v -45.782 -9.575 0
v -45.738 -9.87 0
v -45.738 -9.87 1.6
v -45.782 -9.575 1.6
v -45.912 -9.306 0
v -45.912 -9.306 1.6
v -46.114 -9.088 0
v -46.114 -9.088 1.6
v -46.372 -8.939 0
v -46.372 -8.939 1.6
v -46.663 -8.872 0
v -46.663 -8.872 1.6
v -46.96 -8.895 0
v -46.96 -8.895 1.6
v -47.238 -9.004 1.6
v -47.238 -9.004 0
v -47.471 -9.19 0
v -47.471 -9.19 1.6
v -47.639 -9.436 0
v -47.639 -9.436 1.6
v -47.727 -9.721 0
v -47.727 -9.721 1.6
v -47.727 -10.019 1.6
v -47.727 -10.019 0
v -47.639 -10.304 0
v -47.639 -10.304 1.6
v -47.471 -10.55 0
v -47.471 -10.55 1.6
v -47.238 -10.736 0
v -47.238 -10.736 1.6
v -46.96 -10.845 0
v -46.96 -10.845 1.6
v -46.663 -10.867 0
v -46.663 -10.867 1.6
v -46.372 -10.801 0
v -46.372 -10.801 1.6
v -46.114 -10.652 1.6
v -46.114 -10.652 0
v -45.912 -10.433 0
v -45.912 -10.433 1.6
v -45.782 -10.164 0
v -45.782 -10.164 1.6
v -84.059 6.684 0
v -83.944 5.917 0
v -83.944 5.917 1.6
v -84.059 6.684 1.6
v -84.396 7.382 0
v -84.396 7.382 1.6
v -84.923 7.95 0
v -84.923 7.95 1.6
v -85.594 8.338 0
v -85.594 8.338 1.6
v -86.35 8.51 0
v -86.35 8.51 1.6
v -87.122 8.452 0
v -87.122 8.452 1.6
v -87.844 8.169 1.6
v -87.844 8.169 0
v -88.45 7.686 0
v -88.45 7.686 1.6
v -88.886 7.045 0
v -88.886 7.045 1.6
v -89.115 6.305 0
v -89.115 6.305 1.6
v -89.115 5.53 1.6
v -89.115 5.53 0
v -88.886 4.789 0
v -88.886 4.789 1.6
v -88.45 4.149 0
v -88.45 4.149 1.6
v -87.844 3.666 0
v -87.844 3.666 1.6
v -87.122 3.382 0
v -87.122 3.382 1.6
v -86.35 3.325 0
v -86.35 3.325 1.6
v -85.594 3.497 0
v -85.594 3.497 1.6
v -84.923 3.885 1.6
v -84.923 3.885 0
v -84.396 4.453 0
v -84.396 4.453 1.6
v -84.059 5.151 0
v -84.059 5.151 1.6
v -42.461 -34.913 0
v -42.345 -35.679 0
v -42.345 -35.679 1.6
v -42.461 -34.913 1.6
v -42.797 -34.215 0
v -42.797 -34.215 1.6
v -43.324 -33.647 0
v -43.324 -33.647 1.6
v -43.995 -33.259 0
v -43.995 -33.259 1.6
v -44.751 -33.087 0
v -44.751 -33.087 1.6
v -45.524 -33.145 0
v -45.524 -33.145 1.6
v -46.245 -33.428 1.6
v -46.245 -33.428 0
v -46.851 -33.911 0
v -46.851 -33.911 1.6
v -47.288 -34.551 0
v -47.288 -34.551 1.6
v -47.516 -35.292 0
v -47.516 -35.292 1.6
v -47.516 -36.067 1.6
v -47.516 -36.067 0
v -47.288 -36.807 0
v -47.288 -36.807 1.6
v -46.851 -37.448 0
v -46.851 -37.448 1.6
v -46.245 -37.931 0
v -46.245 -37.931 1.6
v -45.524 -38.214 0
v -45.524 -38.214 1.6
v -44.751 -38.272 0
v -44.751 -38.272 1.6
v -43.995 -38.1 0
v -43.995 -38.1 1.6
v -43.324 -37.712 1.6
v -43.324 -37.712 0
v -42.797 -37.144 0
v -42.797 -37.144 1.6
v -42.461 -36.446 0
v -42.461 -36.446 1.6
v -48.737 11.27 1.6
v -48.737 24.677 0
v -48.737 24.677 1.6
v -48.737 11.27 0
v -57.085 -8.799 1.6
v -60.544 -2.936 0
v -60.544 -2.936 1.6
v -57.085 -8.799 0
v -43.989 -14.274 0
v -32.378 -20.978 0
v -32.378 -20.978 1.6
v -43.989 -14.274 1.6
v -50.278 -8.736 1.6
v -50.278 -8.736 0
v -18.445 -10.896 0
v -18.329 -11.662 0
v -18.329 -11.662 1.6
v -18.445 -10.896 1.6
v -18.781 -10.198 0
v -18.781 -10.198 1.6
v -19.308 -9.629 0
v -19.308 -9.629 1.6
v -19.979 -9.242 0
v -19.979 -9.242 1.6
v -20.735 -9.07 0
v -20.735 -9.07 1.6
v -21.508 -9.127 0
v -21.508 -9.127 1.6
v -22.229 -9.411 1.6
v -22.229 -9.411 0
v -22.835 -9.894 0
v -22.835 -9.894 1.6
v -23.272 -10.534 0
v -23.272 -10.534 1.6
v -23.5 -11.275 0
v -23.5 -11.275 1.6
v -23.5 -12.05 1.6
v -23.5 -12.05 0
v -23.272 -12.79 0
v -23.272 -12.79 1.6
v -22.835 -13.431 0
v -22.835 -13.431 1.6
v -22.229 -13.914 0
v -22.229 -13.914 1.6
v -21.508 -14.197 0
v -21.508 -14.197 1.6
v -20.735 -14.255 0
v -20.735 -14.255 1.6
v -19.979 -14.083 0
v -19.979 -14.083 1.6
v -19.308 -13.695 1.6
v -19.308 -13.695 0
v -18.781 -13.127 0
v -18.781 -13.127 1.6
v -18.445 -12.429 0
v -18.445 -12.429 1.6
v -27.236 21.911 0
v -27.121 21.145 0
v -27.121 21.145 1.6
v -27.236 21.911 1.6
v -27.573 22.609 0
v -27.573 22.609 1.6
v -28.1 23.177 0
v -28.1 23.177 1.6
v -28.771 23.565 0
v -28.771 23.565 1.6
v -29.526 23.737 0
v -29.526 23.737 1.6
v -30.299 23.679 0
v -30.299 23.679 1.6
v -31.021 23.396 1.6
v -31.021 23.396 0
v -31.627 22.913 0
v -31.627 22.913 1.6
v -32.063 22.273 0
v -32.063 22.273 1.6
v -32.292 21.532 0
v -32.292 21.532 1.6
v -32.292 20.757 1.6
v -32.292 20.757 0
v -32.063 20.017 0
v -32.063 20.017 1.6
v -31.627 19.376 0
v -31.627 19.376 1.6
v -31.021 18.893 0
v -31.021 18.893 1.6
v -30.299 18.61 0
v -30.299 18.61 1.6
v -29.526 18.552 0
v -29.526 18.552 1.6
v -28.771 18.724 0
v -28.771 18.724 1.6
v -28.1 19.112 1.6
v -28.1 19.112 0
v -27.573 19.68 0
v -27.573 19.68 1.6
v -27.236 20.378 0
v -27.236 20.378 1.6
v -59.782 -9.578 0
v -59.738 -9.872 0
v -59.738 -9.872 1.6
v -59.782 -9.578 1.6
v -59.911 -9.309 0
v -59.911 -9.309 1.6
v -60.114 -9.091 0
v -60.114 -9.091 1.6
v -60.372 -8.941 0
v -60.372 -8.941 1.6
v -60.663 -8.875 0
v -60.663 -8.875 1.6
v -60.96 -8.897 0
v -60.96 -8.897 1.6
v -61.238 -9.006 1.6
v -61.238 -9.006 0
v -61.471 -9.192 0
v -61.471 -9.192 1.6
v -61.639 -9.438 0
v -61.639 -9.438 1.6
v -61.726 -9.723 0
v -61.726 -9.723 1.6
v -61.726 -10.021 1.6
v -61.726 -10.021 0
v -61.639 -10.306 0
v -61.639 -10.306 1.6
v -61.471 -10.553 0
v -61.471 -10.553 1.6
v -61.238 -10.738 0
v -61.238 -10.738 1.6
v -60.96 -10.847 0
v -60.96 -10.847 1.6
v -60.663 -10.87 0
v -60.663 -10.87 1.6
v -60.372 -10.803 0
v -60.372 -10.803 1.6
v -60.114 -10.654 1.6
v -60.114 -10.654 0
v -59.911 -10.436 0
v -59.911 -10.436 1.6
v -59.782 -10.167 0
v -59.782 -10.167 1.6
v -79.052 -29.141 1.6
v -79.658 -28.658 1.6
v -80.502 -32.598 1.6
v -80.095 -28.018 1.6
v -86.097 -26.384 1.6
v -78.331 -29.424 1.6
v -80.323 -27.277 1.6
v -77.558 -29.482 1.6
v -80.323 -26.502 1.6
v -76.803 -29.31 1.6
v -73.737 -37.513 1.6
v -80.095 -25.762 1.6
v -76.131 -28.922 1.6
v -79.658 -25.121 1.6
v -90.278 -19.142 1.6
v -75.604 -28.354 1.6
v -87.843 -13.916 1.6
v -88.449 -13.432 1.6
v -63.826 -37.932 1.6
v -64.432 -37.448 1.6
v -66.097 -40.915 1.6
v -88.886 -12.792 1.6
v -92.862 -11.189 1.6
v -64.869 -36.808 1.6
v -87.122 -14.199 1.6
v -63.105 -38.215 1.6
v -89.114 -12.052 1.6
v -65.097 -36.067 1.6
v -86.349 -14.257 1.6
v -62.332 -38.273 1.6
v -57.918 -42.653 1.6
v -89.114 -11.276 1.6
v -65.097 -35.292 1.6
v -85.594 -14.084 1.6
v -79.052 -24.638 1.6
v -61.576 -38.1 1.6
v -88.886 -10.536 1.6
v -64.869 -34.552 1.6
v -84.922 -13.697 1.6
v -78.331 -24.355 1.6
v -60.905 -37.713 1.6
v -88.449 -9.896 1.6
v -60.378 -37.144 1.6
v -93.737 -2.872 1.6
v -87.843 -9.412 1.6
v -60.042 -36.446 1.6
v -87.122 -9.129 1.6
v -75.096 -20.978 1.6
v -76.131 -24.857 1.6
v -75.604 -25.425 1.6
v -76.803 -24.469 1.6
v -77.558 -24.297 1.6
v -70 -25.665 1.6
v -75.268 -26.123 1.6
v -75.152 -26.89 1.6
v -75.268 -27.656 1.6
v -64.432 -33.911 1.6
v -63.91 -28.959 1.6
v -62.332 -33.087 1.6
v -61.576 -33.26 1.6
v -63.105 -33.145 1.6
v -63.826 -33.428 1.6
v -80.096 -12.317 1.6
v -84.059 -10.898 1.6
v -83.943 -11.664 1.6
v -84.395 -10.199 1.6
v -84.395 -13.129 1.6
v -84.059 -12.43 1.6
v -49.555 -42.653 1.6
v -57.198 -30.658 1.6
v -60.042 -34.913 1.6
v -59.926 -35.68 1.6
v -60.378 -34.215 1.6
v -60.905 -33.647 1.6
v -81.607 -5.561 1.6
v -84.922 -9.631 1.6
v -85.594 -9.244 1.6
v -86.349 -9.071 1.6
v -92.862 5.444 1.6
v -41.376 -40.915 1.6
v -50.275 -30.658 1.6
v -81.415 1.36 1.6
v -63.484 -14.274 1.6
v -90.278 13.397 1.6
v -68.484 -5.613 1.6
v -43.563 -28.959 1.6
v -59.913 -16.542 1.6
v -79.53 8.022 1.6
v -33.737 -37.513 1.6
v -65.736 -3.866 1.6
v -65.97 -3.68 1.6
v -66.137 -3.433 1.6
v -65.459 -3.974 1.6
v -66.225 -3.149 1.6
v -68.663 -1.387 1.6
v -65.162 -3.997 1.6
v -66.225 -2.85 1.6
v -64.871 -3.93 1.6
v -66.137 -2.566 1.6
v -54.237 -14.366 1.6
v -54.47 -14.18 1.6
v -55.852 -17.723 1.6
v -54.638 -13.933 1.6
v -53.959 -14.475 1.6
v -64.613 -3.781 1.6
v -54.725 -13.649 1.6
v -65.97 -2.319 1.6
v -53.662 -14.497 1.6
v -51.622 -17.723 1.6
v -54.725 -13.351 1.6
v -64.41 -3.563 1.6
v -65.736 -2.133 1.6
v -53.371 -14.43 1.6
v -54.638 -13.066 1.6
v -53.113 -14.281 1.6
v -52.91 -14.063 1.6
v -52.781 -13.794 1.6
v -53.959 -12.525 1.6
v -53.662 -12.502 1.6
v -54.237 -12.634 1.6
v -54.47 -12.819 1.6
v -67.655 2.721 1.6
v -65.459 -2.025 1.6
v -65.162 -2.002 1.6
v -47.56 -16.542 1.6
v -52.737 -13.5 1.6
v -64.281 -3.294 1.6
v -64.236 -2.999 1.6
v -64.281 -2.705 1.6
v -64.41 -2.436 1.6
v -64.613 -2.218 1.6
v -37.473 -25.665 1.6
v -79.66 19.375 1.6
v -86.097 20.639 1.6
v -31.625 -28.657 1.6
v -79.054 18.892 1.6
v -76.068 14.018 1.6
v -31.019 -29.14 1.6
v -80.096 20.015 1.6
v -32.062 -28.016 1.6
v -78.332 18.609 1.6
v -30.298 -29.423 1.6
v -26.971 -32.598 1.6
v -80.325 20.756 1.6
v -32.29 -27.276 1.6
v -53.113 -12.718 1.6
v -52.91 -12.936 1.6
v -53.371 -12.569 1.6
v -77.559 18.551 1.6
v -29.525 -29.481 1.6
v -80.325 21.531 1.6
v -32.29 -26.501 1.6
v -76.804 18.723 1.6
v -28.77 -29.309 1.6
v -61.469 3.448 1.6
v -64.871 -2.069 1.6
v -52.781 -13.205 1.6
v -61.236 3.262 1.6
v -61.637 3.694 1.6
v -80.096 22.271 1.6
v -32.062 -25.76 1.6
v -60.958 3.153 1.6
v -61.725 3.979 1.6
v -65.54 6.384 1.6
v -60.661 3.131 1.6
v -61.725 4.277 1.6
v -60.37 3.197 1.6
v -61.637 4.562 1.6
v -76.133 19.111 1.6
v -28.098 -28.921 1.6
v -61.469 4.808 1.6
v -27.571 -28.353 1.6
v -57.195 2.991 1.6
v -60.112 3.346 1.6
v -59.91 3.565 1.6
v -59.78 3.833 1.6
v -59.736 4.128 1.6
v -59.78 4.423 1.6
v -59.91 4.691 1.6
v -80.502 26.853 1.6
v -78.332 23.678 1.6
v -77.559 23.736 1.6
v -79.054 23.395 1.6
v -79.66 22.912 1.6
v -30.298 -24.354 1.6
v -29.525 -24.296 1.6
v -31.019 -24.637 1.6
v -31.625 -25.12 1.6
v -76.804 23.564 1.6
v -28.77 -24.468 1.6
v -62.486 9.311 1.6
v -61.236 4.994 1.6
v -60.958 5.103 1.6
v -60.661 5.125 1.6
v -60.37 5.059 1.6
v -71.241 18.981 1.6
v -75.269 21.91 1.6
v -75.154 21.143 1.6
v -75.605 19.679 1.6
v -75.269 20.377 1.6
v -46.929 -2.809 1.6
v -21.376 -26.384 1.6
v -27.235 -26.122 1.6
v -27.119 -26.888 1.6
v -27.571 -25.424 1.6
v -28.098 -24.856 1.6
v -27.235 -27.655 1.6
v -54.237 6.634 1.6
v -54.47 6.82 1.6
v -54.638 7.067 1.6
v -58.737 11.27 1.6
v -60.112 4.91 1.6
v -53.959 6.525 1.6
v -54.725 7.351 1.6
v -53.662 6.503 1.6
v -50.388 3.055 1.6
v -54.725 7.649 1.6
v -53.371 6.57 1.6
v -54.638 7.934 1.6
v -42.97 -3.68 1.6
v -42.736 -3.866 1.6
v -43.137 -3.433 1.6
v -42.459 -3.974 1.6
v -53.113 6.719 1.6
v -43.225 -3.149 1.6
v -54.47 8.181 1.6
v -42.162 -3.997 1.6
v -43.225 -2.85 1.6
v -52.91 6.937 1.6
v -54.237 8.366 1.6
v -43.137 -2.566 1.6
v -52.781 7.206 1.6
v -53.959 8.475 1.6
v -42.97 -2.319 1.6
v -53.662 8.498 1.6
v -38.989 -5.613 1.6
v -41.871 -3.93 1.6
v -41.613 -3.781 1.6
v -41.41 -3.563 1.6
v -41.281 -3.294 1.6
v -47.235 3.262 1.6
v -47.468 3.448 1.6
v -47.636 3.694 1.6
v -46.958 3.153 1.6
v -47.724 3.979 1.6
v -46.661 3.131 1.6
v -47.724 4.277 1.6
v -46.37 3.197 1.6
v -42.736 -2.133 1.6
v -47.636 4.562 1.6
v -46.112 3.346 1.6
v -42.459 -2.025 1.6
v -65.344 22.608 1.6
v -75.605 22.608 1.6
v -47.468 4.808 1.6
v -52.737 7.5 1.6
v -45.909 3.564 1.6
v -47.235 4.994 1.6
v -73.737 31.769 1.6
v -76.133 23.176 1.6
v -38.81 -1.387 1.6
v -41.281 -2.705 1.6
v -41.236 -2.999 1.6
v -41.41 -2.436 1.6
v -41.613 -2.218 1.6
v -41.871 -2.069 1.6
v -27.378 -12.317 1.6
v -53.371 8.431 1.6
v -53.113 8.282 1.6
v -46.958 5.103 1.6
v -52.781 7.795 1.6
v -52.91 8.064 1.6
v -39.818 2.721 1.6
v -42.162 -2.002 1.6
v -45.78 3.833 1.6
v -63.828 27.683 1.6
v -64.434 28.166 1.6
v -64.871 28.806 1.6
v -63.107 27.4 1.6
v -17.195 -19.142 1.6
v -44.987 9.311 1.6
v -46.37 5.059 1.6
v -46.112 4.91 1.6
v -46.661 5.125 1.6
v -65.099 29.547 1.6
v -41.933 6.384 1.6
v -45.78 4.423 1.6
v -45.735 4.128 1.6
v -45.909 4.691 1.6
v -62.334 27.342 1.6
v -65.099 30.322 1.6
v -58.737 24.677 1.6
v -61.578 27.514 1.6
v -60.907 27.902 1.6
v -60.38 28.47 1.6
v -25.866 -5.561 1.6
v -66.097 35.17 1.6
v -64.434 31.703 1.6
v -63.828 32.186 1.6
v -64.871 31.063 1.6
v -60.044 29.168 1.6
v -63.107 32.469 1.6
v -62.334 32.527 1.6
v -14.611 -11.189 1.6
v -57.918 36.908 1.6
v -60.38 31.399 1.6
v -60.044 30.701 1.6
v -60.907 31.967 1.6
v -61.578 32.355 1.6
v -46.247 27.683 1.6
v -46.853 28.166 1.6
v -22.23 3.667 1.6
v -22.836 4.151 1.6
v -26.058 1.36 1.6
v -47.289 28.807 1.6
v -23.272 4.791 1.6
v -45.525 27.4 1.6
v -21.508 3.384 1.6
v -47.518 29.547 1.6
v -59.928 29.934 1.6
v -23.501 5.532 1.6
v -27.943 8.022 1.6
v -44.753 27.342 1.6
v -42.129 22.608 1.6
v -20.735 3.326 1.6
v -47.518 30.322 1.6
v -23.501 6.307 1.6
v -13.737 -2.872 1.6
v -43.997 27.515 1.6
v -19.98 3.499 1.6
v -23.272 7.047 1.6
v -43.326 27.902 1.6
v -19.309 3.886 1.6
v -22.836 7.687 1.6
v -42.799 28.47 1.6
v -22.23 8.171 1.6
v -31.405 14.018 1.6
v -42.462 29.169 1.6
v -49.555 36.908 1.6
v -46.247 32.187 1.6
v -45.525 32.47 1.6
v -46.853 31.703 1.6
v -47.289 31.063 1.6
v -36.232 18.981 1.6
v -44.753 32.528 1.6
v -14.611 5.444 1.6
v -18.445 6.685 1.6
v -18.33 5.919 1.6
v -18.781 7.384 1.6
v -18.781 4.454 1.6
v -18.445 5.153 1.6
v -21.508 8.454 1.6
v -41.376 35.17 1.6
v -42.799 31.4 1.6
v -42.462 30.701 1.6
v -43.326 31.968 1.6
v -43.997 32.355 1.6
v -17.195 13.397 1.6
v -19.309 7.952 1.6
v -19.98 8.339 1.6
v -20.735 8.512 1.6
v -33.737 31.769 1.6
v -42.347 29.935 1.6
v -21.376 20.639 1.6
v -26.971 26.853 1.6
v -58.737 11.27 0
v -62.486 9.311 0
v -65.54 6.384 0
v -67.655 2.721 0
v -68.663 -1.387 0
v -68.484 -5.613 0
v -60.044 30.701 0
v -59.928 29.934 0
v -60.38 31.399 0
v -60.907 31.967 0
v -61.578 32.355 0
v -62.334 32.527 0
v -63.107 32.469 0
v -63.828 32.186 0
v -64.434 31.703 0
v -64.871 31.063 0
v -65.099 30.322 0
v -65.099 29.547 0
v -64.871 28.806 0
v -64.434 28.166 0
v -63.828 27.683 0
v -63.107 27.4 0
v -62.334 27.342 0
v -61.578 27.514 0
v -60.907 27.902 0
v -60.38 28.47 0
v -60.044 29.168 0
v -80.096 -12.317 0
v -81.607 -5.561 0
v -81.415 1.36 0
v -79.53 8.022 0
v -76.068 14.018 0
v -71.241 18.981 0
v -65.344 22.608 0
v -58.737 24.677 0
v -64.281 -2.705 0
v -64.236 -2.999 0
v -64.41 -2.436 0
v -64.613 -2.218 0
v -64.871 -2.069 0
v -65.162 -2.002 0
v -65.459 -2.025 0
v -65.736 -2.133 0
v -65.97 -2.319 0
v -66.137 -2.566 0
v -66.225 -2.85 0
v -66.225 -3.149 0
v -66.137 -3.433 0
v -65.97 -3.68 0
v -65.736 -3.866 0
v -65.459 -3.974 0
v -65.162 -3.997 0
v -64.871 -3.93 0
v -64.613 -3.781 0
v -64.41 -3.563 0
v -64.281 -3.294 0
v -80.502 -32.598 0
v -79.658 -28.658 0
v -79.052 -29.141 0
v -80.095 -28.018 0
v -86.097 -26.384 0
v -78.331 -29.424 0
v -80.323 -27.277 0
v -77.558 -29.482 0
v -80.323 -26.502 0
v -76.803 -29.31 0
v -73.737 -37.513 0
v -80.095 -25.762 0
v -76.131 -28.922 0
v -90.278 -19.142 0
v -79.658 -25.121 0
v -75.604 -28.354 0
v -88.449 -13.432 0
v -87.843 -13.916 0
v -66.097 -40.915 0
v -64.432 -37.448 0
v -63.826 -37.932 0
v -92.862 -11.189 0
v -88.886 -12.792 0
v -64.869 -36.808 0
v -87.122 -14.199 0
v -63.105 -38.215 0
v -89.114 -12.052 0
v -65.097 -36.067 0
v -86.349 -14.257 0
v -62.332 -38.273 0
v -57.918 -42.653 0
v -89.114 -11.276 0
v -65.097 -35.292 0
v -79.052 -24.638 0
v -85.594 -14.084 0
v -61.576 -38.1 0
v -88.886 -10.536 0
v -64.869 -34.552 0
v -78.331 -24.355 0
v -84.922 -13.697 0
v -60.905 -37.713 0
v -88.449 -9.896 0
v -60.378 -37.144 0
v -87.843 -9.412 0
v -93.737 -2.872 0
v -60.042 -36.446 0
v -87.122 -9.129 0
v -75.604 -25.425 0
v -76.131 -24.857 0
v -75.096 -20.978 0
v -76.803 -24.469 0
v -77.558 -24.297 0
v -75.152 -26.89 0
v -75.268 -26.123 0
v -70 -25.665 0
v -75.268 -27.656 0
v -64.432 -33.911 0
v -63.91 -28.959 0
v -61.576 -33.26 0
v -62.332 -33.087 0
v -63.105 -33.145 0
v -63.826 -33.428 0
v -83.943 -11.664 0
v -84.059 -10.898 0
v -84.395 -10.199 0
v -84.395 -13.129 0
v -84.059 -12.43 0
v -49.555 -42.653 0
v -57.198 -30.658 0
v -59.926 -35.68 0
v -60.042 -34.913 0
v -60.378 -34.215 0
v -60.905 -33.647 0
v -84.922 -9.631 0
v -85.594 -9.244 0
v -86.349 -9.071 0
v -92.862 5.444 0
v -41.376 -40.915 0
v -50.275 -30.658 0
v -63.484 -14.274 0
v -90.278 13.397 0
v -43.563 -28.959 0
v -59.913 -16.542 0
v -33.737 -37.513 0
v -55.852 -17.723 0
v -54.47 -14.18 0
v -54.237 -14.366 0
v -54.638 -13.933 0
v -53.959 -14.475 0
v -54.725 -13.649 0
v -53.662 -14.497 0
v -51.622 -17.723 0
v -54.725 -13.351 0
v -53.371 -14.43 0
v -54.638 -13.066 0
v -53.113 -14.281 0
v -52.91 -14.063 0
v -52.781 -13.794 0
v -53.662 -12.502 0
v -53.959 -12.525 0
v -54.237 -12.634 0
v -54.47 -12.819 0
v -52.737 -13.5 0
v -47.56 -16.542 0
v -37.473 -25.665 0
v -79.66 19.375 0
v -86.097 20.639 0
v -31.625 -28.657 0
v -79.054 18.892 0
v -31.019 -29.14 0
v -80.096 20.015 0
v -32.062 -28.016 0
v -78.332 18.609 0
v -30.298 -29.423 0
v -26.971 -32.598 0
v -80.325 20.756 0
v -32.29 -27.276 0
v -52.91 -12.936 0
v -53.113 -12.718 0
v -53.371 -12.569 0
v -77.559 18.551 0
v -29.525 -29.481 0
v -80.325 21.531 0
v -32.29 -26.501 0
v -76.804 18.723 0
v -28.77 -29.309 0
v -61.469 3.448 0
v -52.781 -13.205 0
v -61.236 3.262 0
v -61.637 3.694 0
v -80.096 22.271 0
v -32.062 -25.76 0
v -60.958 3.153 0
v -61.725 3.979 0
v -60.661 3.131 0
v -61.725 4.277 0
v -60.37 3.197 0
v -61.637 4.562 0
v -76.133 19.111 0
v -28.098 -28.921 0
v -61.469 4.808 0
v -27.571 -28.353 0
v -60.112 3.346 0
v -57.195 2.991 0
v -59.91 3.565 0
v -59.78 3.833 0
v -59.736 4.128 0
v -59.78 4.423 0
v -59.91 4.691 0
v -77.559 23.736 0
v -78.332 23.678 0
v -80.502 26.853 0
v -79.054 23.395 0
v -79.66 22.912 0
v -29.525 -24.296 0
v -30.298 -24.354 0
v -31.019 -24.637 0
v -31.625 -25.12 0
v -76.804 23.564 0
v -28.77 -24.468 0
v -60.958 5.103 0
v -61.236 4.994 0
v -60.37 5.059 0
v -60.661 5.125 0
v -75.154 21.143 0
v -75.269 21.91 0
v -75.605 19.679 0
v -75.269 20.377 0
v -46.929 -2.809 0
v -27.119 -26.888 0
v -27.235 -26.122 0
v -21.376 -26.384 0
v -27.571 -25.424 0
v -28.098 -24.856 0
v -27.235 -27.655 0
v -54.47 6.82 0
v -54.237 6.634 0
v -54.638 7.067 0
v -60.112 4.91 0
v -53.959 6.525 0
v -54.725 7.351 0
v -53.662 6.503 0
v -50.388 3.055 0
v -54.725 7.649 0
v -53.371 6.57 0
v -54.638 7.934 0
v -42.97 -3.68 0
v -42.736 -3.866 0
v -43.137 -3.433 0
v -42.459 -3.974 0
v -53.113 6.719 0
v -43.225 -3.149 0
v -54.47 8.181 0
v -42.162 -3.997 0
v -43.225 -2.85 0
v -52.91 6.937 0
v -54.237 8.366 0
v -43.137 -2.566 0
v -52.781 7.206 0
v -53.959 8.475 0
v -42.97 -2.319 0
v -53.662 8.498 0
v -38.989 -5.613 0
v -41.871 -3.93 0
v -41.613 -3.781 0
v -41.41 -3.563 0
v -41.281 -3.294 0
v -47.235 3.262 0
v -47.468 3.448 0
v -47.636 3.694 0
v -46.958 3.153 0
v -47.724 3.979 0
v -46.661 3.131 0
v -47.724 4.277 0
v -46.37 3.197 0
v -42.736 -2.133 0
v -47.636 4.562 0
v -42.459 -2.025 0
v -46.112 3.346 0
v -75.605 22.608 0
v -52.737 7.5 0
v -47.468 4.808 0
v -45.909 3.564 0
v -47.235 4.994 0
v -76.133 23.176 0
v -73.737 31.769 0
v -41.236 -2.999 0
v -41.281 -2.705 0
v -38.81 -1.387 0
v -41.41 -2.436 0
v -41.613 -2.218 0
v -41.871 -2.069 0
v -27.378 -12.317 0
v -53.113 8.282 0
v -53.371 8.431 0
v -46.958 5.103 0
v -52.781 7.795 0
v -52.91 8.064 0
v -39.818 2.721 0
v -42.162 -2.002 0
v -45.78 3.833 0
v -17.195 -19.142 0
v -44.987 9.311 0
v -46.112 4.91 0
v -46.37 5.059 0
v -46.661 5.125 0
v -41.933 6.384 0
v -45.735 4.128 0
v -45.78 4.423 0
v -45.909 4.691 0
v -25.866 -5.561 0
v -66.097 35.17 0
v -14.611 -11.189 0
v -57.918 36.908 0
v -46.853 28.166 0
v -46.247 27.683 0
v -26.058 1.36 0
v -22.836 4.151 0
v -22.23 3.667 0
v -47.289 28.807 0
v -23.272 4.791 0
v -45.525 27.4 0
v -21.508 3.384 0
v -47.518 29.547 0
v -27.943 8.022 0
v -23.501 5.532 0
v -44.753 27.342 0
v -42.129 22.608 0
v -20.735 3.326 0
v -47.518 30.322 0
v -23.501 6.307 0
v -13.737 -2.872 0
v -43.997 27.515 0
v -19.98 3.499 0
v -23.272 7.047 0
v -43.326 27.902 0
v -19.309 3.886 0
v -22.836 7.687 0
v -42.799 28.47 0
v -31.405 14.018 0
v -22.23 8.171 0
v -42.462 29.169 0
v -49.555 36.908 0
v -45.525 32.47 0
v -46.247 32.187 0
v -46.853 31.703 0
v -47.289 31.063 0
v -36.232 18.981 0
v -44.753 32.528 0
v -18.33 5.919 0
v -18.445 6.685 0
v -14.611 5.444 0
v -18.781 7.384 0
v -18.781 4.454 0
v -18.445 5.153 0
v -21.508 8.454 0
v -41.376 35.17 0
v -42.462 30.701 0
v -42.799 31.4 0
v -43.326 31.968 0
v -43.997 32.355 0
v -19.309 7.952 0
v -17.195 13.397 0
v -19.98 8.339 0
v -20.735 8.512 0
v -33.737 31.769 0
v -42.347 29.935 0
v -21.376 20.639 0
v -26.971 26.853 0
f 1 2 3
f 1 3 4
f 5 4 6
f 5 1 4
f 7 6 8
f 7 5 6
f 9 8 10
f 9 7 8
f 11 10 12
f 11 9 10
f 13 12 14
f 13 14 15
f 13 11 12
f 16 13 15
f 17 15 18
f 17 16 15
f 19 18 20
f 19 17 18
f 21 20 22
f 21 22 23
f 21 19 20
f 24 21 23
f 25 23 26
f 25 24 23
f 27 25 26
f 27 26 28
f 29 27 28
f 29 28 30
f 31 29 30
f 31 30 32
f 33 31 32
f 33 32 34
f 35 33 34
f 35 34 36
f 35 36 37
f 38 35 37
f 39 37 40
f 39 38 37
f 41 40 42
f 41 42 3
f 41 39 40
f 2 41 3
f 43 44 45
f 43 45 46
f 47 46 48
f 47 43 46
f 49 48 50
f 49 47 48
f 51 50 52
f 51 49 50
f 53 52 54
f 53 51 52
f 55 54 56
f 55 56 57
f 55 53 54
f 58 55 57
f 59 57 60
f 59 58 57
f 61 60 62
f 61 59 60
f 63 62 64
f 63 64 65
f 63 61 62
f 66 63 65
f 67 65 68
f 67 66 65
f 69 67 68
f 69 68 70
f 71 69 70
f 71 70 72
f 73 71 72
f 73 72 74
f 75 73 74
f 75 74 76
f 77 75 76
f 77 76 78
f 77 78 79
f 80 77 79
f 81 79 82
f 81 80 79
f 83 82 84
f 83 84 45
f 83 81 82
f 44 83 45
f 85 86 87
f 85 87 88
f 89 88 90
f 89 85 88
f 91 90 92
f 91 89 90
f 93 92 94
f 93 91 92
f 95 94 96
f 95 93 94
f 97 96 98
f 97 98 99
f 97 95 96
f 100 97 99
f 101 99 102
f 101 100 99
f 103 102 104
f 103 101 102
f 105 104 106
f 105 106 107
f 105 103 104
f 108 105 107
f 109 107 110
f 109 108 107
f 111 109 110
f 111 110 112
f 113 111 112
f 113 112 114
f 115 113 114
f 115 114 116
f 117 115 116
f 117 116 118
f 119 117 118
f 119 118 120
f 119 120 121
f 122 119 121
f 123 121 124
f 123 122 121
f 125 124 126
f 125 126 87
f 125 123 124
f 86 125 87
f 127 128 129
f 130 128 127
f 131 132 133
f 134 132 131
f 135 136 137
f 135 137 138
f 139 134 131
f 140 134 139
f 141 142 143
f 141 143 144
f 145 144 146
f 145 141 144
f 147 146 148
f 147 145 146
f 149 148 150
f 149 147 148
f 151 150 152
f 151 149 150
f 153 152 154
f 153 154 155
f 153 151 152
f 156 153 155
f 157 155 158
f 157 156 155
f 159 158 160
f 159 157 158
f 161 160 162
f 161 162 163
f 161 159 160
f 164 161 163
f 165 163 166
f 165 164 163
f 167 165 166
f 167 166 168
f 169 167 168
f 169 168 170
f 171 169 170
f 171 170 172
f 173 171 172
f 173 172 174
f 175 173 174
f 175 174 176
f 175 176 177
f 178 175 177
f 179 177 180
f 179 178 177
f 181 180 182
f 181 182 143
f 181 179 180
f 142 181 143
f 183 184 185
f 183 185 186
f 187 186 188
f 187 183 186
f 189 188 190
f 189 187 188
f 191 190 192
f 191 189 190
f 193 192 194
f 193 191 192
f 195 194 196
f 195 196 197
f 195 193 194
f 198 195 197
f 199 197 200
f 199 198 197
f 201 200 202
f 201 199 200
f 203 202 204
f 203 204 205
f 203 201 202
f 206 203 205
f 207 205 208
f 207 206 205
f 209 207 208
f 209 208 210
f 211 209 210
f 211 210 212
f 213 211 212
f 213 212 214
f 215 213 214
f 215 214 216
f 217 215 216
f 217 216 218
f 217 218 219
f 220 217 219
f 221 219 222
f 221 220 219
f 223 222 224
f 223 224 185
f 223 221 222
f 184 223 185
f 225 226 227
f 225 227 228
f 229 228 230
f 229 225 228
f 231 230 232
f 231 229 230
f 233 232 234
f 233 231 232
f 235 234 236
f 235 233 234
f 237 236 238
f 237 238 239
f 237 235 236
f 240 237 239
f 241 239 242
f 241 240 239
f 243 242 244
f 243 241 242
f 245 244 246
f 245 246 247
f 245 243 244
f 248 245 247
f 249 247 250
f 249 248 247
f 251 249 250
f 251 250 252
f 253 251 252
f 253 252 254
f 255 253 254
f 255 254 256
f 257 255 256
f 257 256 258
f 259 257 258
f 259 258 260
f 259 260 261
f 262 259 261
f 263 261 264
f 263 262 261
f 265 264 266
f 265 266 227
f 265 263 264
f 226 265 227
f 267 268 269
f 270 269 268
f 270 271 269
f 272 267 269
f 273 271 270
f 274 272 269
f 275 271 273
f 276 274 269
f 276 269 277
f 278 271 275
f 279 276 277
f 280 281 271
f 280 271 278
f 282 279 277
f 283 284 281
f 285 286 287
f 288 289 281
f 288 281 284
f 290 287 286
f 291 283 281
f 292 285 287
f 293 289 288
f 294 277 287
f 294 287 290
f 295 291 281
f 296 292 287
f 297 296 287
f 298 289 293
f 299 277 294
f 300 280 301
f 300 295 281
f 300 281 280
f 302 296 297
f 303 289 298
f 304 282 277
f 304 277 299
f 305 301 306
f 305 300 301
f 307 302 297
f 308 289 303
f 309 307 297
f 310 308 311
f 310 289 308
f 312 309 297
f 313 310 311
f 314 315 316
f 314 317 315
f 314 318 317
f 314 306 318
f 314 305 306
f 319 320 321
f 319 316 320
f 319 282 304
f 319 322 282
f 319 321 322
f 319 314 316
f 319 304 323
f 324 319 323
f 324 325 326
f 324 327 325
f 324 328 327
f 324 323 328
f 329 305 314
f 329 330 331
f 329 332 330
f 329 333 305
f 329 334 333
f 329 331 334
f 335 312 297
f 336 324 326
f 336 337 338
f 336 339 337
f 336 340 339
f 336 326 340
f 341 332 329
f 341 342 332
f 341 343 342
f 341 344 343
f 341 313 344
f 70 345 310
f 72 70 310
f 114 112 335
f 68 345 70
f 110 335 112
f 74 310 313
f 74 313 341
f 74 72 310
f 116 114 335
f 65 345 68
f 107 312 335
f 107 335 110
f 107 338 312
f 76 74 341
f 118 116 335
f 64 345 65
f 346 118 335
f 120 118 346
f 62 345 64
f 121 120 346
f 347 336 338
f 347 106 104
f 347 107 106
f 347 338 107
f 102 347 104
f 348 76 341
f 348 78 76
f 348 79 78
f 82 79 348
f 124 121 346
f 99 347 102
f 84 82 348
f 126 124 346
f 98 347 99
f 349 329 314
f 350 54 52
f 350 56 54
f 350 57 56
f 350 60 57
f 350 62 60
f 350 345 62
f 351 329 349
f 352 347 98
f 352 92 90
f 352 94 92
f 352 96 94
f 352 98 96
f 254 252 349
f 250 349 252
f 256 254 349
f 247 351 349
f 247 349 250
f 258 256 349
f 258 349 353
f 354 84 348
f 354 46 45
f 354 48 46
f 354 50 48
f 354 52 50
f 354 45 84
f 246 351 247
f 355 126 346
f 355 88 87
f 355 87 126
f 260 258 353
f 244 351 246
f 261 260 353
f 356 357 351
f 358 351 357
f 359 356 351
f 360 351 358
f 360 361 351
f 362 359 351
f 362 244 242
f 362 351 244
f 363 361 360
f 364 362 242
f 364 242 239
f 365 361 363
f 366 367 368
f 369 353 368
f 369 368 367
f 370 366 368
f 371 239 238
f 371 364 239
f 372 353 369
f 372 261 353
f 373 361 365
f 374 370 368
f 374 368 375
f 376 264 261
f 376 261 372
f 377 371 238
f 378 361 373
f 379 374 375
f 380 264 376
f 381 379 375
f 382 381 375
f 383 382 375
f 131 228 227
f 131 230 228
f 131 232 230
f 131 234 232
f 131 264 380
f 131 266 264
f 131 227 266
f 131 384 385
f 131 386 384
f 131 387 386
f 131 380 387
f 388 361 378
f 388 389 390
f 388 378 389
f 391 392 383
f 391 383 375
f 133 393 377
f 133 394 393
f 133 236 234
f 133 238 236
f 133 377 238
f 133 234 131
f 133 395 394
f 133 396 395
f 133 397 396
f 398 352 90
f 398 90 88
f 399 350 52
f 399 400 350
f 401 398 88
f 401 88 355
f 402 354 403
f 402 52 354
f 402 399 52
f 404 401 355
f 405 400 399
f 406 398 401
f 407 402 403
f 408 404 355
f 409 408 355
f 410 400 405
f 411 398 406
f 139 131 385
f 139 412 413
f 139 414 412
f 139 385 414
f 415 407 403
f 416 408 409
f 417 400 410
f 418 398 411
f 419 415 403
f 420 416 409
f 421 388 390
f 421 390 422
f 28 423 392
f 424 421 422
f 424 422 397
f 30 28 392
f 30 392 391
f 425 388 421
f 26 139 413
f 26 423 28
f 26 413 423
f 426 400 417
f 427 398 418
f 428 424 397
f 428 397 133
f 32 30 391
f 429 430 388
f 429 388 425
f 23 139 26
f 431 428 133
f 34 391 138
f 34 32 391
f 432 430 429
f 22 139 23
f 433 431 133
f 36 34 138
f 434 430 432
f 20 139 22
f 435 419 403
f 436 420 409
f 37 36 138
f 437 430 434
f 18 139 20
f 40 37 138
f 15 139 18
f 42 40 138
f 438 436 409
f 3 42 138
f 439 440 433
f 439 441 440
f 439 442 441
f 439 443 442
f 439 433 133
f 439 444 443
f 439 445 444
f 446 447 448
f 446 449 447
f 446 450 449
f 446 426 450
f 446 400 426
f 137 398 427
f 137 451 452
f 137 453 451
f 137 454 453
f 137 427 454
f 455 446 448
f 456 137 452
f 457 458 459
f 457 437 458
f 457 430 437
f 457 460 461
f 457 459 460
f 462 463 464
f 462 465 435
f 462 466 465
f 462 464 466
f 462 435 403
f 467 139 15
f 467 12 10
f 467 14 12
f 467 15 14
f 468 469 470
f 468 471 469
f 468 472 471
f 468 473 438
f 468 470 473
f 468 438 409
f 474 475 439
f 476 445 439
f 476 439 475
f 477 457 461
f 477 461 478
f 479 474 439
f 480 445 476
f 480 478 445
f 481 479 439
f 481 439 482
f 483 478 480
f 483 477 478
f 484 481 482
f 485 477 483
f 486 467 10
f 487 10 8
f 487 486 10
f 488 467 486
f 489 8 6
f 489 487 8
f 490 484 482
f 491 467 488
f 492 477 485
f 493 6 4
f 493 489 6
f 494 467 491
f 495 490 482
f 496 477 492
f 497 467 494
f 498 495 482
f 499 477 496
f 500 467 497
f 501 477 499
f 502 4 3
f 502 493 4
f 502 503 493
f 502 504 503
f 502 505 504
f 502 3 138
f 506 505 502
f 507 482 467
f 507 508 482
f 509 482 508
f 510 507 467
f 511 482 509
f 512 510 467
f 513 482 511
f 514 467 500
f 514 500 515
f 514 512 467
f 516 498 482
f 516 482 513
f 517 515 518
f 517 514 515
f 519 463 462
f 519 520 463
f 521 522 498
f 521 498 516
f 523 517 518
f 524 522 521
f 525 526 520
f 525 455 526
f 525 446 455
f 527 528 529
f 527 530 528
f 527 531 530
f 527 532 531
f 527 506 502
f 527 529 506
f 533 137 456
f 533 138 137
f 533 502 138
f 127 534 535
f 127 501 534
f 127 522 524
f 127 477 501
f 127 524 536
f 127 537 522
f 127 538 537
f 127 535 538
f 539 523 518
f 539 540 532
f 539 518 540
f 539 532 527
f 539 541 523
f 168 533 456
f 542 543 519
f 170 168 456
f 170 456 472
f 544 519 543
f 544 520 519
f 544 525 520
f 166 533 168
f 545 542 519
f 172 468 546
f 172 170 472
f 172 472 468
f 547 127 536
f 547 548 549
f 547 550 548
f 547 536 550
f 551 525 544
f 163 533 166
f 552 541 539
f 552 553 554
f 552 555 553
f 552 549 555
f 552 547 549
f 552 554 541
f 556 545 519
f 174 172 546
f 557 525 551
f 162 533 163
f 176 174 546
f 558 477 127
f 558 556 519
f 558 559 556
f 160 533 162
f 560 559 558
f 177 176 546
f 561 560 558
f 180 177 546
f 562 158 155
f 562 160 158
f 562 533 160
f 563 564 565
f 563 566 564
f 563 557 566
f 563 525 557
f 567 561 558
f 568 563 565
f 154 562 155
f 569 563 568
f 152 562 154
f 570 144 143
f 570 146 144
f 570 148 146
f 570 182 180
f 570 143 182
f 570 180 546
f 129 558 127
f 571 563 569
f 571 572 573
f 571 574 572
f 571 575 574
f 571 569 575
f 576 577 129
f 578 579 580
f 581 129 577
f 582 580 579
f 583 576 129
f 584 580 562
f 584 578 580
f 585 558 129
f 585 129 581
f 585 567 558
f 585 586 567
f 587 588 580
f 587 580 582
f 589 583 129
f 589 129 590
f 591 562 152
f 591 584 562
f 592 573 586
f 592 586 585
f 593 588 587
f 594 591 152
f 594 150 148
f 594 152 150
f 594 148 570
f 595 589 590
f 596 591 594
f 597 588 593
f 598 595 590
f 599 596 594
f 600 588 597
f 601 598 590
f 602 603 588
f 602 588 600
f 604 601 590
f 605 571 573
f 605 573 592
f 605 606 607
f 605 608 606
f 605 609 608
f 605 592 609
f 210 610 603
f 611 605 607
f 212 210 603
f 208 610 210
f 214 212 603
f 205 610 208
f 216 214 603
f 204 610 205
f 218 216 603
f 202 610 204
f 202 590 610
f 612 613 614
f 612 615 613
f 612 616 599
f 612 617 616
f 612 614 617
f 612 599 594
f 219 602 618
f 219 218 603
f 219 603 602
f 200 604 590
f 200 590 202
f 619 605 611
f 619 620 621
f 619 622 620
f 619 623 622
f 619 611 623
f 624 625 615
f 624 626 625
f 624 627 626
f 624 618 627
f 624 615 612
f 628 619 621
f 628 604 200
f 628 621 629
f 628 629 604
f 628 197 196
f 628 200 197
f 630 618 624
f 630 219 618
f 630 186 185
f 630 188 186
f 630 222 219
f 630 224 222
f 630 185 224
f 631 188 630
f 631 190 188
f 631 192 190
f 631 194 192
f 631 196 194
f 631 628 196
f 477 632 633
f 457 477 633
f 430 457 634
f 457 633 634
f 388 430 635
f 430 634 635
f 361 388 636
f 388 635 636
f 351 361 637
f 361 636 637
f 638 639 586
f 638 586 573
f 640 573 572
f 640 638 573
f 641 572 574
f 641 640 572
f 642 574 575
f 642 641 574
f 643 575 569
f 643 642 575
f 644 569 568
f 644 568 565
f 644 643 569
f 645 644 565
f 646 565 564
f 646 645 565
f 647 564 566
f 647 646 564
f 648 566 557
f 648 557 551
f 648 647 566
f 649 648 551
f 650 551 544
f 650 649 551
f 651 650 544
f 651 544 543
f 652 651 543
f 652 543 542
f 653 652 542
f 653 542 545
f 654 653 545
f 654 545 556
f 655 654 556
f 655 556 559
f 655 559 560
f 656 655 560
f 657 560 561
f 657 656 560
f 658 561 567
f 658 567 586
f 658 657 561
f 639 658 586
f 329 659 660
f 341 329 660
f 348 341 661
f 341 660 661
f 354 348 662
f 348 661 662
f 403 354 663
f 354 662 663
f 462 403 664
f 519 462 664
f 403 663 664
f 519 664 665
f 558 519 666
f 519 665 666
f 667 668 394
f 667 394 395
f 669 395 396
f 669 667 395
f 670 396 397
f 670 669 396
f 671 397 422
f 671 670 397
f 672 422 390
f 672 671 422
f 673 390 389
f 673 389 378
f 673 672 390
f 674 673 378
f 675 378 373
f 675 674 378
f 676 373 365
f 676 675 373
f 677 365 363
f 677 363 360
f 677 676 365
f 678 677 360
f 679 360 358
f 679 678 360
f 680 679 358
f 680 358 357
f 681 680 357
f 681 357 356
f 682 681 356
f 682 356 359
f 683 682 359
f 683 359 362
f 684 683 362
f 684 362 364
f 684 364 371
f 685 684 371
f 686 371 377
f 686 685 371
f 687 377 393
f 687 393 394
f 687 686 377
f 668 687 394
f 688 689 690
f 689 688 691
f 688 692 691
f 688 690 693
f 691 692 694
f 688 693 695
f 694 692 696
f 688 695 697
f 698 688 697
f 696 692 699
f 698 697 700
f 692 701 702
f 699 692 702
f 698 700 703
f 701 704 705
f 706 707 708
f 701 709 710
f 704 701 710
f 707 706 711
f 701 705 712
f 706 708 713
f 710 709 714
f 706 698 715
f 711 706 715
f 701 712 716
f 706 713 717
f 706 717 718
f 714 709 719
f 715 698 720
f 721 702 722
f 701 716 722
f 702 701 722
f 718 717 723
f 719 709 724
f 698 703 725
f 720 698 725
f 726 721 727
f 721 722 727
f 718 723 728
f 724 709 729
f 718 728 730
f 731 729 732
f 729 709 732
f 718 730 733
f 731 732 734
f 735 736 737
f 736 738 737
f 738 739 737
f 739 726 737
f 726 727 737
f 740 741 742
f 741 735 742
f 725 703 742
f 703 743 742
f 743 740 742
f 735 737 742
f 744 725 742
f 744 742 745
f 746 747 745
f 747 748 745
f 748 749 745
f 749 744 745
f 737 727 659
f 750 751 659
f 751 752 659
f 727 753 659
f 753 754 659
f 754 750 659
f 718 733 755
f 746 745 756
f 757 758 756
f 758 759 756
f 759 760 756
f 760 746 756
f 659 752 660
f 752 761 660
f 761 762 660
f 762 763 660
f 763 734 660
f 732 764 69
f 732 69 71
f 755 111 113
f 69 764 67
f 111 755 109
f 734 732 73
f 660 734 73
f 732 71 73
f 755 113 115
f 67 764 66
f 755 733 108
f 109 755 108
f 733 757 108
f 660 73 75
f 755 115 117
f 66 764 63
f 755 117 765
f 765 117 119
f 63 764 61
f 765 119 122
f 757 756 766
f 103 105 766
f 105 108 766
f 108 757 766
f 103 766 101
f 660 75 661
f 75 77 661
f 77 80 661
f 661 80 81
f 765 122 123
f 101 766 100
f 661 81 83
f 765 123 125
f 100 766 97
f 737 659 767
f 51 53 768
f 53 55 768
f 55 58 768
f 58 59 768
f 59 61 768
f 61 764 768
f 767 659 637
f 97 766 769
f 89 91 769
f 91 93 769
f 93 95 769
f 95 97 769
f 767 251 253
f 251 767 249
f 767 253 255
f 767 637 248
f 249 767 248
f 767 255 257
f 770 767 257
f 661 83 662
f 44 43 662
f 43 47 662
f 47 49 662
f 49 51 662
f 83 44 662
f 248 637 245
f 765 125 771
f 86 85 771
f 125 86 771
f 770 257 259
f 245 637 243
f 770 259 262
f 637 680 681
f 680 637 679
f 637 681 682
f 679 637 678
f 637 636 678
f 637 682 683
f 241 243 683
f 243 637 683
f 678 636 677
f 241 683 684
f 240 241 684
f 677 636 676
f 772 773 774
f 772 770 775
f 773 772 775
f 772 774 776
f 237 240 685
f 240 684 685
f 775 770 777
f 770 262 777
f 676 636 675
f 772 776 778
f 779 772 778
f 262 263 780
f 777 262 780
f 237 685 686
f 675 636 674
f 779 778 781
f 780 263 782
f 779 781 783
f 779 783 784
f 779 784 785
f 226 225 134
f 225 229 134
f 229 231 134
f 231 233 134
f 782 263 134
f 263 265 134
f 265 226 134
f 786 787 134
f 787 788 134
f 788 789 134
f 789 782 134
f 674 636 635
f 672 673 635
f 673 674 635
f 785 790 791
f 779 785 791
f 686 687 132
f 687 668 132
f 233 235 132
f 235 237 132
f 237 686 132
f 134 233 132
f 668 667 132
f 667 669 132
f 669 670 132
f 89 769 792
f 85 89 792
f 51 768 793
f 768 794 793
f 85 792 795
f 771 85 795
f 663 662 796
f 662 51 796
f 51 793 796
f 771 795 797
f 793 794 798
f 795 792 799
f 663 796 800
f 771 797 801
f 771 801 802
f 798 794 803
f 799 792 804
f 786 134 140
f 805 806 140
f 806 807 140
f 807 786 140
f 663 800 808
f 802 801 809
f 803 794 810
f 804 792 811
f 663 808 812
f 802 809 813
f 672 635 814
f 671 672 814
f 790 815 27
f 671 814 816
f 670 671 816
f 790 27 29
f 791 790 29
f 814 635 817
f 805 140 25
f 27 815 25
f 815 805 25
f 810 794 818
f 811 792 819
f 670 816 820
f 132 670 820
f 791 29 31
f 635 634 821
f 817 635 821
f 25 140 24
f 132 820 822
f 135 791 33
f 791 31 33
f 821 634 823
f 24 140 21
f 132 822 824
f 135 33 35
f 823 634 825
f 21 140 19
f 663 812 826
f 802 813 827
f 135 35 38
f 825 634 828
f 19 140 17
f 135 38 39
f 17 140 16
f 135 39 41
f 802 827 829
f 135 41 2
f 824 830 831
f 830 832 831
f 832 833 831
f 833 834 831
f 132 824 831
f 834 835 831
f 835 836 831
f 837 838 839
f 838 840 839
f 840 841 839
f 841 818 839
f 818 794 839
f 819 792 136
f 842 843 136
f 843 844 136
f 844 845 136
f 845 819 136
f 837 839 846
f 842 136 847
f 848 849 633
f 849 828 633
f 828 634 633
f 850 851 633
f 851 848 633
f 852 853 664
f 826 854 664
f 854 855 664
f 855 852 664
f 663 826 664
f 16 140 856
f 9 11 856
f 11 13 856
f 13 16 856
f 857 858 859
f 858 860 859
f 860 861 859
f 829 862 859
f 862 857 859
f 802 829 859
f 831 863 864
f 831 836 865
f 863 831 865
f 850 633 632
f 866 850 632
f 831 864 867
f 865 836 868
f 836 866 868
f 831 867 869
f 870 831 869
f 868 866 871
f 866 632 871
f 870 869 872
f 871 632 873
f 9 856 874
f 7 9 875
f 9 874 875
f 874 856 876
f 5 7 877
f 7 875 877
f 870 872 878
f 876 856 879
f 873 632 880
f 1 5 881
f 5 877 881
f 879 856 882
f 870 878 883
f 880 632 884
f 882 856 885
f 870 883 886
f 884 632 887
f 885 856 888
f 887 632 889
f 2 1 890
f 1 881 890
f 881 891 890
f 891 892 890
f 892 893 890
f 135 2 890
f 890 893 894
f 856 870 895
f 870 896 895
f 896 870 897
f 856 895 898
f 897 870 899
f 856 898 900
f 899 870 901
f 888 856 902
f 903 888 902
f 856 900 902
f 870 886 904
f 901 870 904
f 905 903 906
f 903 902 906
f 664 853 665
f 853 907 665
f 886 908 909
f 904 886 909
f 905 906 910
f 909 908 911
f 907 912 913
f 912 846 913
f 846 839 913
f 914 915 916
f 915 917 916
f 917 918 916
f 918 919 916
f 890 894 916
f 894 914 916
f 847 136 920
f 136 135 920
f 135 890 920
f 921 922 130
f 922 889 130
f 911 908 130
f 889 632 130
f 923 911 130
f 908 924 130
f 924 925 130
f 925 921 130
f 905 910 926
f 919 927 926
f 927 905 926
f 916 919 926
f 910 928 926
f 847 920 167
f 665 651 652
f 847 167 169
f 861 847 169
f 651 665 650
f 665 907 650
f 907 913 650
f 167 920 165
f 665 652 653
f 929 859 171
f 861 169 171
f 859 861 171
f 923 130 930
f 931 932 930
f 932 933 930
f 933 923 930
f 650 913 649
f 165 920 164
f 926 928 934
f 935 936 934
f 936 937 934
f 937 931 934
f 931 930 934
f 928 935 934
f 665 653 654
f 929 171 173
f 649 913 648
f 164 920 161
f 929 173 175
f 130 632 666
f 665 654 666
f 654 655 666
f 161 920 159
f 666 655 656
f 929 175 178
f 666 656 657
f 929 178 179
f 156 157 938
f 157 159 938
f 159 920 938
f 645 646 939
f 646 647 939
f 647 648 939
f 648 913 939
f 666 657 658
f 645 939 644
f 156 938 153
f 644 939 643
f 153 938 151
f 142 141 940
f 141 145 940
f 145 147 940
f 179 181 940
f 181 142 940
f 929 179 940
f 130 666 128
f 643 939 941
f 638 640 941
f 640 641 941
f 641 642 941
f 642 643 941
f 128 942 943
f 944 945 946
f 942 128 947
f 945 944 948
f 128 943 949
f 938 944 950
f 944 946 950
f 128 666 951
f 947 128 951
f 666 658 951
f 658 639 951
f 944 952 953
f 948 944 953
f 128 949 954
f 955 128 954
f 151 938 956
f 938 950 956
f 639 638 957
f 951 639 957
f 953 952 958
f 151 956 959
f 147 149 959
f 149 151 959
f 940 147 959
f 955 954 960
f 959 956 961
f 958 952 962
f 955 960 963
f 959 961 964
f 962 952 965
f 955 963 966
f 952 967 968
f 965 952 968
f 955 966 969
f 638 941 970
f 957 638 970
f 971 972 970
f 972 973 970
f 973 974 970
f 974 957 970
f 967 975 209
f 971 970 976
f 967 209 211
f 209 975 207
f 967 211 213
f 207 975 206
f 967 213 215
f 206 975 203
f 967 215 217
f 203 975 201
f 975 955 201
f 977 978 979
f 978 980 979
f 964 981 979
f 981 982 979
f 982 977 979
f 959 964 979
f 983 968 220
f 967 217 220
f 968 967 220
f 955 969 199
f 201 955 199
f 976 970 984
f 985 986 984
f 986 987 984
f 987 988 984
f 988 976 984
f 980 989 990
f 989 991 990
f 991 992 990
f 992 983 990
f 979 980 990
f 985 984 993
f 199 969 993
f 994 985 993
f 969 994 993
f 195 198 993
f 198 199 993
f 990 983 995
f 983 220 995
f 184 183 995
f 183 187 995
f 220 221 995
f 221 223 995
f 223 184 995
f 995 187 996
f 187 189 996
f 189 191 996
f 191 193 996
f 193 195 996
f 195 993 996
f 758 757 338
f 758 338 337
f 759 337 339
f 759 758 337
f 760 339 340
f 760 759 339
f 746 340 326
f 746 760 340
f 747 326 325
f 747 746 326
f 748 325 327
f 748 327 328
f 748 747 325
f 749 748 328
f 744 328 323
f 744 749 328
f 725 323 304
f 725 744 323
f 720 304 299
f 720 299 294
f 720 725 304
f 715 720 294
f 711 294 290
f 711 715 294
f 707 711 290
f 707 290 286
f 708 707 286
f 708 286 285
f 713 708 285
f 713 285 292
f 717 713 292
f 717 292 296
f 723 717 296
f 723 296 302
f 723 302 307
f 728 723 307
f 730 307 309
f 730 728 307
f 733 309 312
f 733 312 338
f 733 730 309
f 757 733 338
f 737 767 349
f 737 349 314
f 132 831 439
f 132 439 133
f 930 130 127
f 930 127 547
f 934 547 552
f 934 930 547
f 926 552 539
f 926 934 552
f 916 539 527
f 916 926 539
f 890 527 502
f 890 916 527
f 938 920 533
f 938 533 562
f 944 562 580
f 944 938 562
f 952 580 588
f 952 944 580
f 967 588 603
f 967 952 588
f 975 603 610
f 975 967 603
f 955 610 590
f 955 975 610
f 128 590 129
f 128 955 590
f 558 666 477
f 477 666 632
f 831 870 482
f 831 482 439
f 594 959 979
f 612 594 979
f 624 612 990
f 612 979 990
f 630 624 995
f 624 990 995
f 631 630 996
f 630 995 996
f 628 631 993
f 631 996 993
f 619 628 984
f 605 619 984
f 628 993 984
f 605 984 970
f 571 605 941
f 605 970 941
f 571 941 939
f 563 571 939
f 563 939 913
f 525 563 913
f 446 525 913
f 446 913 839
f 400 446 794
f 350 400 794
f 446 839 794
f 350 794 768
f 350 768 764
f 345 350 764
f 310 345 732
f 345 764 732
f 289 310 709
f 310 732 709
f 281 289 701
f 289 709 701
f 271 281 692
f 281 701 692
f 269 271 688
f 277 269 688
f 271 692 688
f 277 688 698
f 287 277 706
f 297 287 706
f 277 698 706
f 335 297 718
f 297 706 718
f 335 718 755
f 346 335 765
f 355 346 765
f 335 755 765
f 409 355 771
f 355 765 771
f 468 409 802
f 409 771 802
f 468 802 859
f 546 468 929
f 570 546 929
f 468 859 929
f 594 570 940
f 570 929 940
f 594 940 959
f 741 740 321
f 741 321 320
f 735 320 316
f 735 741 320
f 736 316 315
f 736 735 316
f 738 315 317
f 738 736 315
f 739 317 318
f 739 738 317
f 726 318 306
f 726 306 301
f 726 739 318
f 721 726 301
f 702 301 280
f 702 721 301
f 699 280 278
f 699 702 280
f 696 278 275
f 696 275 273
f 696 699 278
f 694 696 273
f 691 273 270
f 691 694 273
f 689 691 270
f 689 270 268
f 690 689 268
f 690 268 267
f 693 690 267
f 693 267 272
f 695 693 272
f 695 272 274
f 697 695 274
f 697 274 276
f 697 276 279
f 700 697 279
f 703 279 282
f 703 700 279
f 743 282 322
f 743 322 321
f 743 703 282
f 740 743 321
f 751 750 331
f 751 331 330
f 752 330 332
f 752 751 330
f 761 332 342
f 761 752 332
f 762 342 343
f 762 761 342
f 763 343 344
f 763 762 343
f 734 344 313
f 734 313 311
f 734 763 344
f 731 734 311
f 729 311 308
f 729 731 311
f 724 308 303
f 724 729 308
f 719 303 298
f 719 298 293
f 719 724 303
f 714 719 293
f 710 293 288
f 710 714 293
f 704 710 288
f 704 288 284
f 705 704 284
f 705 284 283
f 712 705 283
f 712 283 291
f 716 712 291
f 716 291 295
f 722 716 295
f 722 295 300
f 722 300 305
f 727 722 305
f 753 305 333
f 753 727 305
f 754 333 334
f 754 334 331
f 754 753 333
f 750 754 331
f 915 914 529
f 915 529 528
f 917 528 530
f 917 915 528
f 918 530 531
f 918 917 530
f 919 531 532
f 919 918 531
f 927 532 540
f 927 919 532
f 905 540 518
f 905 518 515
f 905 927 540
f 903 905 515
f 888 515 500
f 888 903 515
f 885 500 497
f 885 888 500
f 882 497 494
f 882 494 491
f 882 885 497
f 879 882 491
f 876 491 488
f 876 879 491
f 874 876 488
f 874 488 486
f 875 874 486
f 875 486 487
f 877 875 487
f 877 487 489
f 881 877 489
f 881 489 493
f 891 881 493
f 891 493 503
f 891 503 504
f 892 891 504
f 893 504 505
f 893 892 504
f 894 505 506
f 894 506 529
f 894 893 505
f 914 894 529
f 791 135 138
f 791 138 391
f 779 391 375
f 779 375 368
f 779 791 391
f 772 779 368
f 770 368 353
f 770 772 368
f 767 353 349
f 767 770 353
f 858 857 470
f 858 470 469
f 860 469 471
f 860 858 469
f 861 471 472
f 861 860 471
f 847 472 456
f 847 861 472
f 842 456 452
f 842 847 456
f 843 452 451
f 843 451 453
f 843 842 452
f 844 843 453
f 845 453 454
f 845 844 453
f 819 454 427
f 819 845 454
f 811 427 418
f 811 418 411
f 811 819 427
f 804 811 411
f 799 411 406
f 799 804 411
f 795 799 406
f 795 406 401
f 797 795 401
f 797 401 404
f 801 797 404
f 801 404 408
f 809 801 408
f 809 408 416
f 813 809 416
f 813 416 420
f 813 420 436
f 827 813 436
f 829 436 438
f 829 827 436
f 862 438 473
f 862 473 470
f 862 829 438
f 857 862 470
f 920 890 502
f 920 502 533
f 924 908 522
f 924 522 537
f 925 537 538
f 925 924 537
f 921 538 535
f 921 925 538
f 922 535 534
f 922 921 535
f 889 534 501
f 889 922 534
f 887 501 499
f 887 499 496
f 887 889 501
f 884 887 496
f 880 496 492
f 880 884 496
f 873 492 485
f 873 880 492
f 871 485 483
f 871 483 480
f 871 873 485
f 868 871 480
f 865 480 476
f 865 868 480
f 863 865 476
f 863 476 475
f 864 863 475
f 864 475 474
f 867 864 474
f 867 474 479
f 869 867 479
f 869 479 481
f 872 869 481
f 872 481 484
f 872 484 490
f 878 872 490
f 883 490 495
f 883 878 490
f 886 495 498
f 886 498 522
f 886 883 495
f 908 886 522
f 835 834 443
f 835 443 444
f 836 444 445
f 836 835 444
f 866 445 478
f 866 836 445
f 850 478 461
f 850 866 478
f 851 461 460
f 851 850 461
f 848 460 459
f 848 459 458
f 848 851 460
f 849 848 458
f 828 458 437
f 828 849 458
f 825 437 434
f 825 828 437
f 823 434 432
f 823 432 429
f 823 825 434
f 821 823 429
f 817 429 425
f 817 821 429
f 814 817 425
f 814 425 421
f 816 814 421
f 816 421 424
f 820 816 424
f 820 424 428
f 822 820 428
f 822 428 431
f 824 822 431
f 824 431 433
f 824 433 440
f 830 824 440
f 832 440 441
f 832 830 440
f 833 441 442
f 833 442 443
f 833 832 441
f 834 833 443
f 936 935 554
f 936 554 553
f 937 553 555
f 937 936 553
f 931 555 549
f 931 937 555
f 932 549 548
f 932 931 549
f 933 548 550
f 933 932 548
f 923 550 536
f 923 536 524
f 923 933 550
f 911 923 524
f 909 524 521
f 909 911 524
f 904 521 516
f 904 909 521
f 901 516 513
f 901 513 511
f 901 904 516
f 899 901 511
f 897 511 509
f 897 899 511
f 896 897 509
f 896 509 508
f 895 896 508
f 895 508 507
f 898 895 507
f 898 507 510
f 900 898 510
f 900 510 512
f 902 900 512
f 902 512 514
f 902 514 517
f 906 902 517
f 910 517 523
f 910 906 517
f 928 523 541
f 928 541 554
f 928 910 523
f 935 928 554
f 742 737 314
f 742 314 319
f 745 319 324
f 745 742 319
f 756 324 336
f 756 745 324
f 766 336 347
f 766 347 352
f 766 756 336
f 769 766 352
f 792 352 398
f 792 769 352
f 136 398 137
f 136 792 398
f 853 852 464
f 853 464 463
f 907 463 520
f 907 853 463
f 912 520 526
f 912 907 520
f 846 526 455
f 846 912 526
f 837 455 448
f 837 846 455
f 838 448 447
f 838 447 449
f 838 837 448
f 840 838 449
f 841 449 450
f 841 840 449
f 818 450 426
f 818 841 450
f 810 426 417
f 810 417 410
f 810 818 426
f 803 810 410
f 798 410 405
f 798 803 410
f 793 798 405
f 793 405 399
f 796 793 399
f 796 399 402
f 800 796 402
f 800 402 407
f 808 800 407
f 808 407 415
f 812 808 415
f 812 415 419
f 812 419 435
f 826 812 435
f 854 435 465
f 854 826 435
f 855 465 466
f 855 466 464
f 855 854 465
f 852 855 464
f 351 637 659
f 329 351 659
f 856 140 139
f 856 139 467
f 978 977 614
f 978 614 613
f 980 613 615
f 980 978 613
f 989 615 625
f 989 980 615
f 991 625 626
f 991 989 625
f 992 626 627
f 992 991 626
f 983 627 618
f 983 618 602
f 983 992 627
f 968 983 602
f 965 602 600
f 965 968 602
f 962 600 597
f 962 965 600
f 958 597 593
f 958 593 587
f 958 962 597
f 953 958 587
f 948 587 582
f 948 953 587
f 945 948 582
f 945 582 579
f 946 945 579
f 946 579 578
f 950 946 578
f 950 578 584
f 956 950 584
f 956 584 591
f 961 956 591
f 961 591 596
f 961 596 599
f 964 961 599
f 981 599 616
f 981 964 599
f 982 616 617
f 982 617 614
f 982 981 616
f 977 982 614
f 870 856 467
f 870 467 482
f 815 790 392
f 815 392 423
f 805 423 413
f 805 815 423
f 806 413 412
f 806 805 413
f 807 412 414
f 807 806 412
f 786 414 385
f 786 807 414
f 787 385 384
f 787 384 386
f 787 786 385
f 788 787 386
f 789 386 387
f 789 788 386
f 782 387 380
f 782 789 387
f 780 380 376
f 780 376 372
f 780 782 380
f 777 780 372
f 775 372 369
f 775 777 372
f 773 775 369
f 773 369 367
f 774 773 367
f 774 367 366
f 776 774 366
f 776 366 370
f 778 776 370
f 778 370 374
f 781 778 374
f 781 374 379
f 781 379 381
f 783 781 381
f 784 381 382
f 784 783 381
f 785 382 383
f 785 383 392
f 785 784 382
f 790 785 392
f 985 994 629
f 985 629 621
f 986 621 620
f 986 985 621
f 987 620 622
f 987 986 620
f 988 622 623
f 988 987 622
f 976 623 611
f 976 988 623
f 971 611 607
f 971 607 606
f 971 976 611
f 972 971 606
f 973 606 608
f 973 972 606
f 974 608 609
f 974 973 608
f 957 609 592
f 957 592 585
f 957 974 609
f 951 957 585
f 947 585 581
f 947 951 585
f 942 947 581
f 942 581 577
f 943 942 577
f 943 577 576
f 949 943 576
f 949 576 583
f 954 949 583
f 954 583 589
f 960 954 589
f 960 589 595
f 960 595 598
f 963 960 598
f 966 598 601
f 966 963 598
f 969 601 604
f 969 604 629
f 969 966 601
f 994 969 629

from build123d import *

# Parameters (mm, degrees)
SKETCH_8_R      = 40
SKETCH_8_R_2    = 1
SKETCH_8_R_3    = 2.6
EXTRUDE_3_DEPTH = 1.6


with BuildPart() as part:
    # 草图8 → 凸台-拉伸3 (new body)
    with BuildSketch(Plane.XY):
        with Locations((-53.736575471, -2.872479928)):
            Circle(SKETCH_8_R)
        with Locations((-53.736575471, 7.500392818)):
            Circle(SKETCH_8_R_2, mode=Mode.SUBTRACT)
        with Locations((-46.735230698, 4.127771963)):
            Circle(SKETCH_8_R_2, mode=Mode.SUBTRACT)
        with Locations((-42.236448471, -2.999480182)):
            Circle(SKETCH_8_R_2, mode=Mode.SUBTRACT)
        with Locations((-46.737760534, -9.869682445)):
            Circle(SKETCH_8_R_2, mode=Mode.SUBTRACT)
        with Locations((-53.736575471, -13.499607182)):
            Circle(SKETCH_8_R_2, mode=Mode.SUBTRACT)
        with Locations((-60.737570724, -9.872335788)):
            Circle(SKETCH_8_R_2, mode=Mode.SUBTRACT)
        with Locations((-65.236448471, -2.999480182)):
            Circle(SKETCH_8_R_2, mode=Mode.SUBTRACT)
        with Locations((-60.73580463, 4.12809202)):
            Circle(SKETCH_8_R_2, mode=Mode.SUBTRACT)
        with Locations((-62.528088914, 29.934409619)):
            Circle(SKETCH_8_R_3, mode=Mode.SUBTRACT)
        with Locations((-44.946804677, 29.93487656)):
            Circle(SKETCH_8_R_3, mode=Mode.SUBTRACT)
        with Locations((-29.720732426, 21.144638825)):
            Circle(SKETCH_8_R_3, mode=Mode.SUBTRACT)
        with Locations((-20.929685924, 5.919033515)):
            Circle(SKETCH_8_R_3, mode=Mode.SUBTRACT)
        with Locations((-20.929218983, -11.662250722)):
            Circle(SKETCH_8_R_3, mode=Mode.SUBTRACT)
        with Locations((-29.719456719, -26.888322973)):
            Circle(SKETCH_8_R_3, mode=Mode.SUBTRACT)
        with Locations((-44.945062029, -35.679369475)):
            Circle(SKETCH_8_R_3, mode=Mode.SUBTRACT)
        with Locations((-62.526346266, -35.679836416)):
            Circle(SKETCH_8_R_3, mode=Mode.SUBTRACT)
        with Locations((-77.752418517, -26.88959868)):
            Circle(SKETCH_8_R_3, mode=Mode.SUBTRACT)
        with Locations((-86.543465018, -11.66399337)):
            Circle(SKETCH_8_R_3, mode=Mode.SUBTRACT)
        with Locations((-86.543931959, 5.917290867)):
            Circle(SKETCH_8_R_3, mode=Mode.SUBTRACT)
        with Locations((-77.753694224, 21.143363118)):
            Circle(SKETCH_8_R_3, mode=Mode.SUBTRACT)
        with BuildLine():
            Line((-58.736575471, 24.6774747), (-58.736575471, 11.269655696))
            ThreePointArc((-58.736575471, 11.269655696), (-66.726956528, 4.627520072), (-68.484024185, -5.613420721))
            Line((-68.484024185, -5.613420721), (-80.095536052, -12.317330223))
            ThreePointArc((-80.095536052, -12.317330223), (-77.985286777, 11.127520072), (-58.736575471, 24.6774747))
        make_face(mode=Mode.SUBTRACT)
        Polygon((-57.085216568, -8.799480182), (-50.277963232, -8.735988313), (-46.929322134, -2.808988059), (-50.387934374, 3.054520326), (-57.195187711, 2.991028458), (-60.543828808, -2.935971796), align=None, mode=Mode.SUBTRACT)
        with BuildLine():
            Line((-48.736575471, 24.6774747), (-48.736575471, 11.269655696))
            ThreePointArc((-48.736575471, 11.269655696), (-40.746194414, 4.627520072), (-38.989126757, -5.613420721))
            Line((-38.989126757, -5.613420721), (-27.37761489, -12.317330223))
            ThreePointArc((-27.37761489, -12.317330223), (-29.487864165, 11.127520072), (-48.736575471, 24.6774747))
        make_face(mode=Mode.SUBTRACT)
        with BuildLine():
            Line((-32.37761489, -20.977584261), (-43.989126757, -14.273674759))
            ThreePointArc((-43.989126757, -14.273674759), (-53.736575471, -17.872479928), (-63.484024185, -14.273674759))
            Line((-63.484024185, -14.273674759), (-75.095536052, -20.977584261))
            ThreePointArc((-75.095536052, -20.977584261), (-53.736575471, -30.872479928), (-32.37761489, -20.977584261))
        make_face(mode=Mode.SUBTRACT)
    extrude(amount=EXTRUDE_3_DEPTH)


solid = part.part
